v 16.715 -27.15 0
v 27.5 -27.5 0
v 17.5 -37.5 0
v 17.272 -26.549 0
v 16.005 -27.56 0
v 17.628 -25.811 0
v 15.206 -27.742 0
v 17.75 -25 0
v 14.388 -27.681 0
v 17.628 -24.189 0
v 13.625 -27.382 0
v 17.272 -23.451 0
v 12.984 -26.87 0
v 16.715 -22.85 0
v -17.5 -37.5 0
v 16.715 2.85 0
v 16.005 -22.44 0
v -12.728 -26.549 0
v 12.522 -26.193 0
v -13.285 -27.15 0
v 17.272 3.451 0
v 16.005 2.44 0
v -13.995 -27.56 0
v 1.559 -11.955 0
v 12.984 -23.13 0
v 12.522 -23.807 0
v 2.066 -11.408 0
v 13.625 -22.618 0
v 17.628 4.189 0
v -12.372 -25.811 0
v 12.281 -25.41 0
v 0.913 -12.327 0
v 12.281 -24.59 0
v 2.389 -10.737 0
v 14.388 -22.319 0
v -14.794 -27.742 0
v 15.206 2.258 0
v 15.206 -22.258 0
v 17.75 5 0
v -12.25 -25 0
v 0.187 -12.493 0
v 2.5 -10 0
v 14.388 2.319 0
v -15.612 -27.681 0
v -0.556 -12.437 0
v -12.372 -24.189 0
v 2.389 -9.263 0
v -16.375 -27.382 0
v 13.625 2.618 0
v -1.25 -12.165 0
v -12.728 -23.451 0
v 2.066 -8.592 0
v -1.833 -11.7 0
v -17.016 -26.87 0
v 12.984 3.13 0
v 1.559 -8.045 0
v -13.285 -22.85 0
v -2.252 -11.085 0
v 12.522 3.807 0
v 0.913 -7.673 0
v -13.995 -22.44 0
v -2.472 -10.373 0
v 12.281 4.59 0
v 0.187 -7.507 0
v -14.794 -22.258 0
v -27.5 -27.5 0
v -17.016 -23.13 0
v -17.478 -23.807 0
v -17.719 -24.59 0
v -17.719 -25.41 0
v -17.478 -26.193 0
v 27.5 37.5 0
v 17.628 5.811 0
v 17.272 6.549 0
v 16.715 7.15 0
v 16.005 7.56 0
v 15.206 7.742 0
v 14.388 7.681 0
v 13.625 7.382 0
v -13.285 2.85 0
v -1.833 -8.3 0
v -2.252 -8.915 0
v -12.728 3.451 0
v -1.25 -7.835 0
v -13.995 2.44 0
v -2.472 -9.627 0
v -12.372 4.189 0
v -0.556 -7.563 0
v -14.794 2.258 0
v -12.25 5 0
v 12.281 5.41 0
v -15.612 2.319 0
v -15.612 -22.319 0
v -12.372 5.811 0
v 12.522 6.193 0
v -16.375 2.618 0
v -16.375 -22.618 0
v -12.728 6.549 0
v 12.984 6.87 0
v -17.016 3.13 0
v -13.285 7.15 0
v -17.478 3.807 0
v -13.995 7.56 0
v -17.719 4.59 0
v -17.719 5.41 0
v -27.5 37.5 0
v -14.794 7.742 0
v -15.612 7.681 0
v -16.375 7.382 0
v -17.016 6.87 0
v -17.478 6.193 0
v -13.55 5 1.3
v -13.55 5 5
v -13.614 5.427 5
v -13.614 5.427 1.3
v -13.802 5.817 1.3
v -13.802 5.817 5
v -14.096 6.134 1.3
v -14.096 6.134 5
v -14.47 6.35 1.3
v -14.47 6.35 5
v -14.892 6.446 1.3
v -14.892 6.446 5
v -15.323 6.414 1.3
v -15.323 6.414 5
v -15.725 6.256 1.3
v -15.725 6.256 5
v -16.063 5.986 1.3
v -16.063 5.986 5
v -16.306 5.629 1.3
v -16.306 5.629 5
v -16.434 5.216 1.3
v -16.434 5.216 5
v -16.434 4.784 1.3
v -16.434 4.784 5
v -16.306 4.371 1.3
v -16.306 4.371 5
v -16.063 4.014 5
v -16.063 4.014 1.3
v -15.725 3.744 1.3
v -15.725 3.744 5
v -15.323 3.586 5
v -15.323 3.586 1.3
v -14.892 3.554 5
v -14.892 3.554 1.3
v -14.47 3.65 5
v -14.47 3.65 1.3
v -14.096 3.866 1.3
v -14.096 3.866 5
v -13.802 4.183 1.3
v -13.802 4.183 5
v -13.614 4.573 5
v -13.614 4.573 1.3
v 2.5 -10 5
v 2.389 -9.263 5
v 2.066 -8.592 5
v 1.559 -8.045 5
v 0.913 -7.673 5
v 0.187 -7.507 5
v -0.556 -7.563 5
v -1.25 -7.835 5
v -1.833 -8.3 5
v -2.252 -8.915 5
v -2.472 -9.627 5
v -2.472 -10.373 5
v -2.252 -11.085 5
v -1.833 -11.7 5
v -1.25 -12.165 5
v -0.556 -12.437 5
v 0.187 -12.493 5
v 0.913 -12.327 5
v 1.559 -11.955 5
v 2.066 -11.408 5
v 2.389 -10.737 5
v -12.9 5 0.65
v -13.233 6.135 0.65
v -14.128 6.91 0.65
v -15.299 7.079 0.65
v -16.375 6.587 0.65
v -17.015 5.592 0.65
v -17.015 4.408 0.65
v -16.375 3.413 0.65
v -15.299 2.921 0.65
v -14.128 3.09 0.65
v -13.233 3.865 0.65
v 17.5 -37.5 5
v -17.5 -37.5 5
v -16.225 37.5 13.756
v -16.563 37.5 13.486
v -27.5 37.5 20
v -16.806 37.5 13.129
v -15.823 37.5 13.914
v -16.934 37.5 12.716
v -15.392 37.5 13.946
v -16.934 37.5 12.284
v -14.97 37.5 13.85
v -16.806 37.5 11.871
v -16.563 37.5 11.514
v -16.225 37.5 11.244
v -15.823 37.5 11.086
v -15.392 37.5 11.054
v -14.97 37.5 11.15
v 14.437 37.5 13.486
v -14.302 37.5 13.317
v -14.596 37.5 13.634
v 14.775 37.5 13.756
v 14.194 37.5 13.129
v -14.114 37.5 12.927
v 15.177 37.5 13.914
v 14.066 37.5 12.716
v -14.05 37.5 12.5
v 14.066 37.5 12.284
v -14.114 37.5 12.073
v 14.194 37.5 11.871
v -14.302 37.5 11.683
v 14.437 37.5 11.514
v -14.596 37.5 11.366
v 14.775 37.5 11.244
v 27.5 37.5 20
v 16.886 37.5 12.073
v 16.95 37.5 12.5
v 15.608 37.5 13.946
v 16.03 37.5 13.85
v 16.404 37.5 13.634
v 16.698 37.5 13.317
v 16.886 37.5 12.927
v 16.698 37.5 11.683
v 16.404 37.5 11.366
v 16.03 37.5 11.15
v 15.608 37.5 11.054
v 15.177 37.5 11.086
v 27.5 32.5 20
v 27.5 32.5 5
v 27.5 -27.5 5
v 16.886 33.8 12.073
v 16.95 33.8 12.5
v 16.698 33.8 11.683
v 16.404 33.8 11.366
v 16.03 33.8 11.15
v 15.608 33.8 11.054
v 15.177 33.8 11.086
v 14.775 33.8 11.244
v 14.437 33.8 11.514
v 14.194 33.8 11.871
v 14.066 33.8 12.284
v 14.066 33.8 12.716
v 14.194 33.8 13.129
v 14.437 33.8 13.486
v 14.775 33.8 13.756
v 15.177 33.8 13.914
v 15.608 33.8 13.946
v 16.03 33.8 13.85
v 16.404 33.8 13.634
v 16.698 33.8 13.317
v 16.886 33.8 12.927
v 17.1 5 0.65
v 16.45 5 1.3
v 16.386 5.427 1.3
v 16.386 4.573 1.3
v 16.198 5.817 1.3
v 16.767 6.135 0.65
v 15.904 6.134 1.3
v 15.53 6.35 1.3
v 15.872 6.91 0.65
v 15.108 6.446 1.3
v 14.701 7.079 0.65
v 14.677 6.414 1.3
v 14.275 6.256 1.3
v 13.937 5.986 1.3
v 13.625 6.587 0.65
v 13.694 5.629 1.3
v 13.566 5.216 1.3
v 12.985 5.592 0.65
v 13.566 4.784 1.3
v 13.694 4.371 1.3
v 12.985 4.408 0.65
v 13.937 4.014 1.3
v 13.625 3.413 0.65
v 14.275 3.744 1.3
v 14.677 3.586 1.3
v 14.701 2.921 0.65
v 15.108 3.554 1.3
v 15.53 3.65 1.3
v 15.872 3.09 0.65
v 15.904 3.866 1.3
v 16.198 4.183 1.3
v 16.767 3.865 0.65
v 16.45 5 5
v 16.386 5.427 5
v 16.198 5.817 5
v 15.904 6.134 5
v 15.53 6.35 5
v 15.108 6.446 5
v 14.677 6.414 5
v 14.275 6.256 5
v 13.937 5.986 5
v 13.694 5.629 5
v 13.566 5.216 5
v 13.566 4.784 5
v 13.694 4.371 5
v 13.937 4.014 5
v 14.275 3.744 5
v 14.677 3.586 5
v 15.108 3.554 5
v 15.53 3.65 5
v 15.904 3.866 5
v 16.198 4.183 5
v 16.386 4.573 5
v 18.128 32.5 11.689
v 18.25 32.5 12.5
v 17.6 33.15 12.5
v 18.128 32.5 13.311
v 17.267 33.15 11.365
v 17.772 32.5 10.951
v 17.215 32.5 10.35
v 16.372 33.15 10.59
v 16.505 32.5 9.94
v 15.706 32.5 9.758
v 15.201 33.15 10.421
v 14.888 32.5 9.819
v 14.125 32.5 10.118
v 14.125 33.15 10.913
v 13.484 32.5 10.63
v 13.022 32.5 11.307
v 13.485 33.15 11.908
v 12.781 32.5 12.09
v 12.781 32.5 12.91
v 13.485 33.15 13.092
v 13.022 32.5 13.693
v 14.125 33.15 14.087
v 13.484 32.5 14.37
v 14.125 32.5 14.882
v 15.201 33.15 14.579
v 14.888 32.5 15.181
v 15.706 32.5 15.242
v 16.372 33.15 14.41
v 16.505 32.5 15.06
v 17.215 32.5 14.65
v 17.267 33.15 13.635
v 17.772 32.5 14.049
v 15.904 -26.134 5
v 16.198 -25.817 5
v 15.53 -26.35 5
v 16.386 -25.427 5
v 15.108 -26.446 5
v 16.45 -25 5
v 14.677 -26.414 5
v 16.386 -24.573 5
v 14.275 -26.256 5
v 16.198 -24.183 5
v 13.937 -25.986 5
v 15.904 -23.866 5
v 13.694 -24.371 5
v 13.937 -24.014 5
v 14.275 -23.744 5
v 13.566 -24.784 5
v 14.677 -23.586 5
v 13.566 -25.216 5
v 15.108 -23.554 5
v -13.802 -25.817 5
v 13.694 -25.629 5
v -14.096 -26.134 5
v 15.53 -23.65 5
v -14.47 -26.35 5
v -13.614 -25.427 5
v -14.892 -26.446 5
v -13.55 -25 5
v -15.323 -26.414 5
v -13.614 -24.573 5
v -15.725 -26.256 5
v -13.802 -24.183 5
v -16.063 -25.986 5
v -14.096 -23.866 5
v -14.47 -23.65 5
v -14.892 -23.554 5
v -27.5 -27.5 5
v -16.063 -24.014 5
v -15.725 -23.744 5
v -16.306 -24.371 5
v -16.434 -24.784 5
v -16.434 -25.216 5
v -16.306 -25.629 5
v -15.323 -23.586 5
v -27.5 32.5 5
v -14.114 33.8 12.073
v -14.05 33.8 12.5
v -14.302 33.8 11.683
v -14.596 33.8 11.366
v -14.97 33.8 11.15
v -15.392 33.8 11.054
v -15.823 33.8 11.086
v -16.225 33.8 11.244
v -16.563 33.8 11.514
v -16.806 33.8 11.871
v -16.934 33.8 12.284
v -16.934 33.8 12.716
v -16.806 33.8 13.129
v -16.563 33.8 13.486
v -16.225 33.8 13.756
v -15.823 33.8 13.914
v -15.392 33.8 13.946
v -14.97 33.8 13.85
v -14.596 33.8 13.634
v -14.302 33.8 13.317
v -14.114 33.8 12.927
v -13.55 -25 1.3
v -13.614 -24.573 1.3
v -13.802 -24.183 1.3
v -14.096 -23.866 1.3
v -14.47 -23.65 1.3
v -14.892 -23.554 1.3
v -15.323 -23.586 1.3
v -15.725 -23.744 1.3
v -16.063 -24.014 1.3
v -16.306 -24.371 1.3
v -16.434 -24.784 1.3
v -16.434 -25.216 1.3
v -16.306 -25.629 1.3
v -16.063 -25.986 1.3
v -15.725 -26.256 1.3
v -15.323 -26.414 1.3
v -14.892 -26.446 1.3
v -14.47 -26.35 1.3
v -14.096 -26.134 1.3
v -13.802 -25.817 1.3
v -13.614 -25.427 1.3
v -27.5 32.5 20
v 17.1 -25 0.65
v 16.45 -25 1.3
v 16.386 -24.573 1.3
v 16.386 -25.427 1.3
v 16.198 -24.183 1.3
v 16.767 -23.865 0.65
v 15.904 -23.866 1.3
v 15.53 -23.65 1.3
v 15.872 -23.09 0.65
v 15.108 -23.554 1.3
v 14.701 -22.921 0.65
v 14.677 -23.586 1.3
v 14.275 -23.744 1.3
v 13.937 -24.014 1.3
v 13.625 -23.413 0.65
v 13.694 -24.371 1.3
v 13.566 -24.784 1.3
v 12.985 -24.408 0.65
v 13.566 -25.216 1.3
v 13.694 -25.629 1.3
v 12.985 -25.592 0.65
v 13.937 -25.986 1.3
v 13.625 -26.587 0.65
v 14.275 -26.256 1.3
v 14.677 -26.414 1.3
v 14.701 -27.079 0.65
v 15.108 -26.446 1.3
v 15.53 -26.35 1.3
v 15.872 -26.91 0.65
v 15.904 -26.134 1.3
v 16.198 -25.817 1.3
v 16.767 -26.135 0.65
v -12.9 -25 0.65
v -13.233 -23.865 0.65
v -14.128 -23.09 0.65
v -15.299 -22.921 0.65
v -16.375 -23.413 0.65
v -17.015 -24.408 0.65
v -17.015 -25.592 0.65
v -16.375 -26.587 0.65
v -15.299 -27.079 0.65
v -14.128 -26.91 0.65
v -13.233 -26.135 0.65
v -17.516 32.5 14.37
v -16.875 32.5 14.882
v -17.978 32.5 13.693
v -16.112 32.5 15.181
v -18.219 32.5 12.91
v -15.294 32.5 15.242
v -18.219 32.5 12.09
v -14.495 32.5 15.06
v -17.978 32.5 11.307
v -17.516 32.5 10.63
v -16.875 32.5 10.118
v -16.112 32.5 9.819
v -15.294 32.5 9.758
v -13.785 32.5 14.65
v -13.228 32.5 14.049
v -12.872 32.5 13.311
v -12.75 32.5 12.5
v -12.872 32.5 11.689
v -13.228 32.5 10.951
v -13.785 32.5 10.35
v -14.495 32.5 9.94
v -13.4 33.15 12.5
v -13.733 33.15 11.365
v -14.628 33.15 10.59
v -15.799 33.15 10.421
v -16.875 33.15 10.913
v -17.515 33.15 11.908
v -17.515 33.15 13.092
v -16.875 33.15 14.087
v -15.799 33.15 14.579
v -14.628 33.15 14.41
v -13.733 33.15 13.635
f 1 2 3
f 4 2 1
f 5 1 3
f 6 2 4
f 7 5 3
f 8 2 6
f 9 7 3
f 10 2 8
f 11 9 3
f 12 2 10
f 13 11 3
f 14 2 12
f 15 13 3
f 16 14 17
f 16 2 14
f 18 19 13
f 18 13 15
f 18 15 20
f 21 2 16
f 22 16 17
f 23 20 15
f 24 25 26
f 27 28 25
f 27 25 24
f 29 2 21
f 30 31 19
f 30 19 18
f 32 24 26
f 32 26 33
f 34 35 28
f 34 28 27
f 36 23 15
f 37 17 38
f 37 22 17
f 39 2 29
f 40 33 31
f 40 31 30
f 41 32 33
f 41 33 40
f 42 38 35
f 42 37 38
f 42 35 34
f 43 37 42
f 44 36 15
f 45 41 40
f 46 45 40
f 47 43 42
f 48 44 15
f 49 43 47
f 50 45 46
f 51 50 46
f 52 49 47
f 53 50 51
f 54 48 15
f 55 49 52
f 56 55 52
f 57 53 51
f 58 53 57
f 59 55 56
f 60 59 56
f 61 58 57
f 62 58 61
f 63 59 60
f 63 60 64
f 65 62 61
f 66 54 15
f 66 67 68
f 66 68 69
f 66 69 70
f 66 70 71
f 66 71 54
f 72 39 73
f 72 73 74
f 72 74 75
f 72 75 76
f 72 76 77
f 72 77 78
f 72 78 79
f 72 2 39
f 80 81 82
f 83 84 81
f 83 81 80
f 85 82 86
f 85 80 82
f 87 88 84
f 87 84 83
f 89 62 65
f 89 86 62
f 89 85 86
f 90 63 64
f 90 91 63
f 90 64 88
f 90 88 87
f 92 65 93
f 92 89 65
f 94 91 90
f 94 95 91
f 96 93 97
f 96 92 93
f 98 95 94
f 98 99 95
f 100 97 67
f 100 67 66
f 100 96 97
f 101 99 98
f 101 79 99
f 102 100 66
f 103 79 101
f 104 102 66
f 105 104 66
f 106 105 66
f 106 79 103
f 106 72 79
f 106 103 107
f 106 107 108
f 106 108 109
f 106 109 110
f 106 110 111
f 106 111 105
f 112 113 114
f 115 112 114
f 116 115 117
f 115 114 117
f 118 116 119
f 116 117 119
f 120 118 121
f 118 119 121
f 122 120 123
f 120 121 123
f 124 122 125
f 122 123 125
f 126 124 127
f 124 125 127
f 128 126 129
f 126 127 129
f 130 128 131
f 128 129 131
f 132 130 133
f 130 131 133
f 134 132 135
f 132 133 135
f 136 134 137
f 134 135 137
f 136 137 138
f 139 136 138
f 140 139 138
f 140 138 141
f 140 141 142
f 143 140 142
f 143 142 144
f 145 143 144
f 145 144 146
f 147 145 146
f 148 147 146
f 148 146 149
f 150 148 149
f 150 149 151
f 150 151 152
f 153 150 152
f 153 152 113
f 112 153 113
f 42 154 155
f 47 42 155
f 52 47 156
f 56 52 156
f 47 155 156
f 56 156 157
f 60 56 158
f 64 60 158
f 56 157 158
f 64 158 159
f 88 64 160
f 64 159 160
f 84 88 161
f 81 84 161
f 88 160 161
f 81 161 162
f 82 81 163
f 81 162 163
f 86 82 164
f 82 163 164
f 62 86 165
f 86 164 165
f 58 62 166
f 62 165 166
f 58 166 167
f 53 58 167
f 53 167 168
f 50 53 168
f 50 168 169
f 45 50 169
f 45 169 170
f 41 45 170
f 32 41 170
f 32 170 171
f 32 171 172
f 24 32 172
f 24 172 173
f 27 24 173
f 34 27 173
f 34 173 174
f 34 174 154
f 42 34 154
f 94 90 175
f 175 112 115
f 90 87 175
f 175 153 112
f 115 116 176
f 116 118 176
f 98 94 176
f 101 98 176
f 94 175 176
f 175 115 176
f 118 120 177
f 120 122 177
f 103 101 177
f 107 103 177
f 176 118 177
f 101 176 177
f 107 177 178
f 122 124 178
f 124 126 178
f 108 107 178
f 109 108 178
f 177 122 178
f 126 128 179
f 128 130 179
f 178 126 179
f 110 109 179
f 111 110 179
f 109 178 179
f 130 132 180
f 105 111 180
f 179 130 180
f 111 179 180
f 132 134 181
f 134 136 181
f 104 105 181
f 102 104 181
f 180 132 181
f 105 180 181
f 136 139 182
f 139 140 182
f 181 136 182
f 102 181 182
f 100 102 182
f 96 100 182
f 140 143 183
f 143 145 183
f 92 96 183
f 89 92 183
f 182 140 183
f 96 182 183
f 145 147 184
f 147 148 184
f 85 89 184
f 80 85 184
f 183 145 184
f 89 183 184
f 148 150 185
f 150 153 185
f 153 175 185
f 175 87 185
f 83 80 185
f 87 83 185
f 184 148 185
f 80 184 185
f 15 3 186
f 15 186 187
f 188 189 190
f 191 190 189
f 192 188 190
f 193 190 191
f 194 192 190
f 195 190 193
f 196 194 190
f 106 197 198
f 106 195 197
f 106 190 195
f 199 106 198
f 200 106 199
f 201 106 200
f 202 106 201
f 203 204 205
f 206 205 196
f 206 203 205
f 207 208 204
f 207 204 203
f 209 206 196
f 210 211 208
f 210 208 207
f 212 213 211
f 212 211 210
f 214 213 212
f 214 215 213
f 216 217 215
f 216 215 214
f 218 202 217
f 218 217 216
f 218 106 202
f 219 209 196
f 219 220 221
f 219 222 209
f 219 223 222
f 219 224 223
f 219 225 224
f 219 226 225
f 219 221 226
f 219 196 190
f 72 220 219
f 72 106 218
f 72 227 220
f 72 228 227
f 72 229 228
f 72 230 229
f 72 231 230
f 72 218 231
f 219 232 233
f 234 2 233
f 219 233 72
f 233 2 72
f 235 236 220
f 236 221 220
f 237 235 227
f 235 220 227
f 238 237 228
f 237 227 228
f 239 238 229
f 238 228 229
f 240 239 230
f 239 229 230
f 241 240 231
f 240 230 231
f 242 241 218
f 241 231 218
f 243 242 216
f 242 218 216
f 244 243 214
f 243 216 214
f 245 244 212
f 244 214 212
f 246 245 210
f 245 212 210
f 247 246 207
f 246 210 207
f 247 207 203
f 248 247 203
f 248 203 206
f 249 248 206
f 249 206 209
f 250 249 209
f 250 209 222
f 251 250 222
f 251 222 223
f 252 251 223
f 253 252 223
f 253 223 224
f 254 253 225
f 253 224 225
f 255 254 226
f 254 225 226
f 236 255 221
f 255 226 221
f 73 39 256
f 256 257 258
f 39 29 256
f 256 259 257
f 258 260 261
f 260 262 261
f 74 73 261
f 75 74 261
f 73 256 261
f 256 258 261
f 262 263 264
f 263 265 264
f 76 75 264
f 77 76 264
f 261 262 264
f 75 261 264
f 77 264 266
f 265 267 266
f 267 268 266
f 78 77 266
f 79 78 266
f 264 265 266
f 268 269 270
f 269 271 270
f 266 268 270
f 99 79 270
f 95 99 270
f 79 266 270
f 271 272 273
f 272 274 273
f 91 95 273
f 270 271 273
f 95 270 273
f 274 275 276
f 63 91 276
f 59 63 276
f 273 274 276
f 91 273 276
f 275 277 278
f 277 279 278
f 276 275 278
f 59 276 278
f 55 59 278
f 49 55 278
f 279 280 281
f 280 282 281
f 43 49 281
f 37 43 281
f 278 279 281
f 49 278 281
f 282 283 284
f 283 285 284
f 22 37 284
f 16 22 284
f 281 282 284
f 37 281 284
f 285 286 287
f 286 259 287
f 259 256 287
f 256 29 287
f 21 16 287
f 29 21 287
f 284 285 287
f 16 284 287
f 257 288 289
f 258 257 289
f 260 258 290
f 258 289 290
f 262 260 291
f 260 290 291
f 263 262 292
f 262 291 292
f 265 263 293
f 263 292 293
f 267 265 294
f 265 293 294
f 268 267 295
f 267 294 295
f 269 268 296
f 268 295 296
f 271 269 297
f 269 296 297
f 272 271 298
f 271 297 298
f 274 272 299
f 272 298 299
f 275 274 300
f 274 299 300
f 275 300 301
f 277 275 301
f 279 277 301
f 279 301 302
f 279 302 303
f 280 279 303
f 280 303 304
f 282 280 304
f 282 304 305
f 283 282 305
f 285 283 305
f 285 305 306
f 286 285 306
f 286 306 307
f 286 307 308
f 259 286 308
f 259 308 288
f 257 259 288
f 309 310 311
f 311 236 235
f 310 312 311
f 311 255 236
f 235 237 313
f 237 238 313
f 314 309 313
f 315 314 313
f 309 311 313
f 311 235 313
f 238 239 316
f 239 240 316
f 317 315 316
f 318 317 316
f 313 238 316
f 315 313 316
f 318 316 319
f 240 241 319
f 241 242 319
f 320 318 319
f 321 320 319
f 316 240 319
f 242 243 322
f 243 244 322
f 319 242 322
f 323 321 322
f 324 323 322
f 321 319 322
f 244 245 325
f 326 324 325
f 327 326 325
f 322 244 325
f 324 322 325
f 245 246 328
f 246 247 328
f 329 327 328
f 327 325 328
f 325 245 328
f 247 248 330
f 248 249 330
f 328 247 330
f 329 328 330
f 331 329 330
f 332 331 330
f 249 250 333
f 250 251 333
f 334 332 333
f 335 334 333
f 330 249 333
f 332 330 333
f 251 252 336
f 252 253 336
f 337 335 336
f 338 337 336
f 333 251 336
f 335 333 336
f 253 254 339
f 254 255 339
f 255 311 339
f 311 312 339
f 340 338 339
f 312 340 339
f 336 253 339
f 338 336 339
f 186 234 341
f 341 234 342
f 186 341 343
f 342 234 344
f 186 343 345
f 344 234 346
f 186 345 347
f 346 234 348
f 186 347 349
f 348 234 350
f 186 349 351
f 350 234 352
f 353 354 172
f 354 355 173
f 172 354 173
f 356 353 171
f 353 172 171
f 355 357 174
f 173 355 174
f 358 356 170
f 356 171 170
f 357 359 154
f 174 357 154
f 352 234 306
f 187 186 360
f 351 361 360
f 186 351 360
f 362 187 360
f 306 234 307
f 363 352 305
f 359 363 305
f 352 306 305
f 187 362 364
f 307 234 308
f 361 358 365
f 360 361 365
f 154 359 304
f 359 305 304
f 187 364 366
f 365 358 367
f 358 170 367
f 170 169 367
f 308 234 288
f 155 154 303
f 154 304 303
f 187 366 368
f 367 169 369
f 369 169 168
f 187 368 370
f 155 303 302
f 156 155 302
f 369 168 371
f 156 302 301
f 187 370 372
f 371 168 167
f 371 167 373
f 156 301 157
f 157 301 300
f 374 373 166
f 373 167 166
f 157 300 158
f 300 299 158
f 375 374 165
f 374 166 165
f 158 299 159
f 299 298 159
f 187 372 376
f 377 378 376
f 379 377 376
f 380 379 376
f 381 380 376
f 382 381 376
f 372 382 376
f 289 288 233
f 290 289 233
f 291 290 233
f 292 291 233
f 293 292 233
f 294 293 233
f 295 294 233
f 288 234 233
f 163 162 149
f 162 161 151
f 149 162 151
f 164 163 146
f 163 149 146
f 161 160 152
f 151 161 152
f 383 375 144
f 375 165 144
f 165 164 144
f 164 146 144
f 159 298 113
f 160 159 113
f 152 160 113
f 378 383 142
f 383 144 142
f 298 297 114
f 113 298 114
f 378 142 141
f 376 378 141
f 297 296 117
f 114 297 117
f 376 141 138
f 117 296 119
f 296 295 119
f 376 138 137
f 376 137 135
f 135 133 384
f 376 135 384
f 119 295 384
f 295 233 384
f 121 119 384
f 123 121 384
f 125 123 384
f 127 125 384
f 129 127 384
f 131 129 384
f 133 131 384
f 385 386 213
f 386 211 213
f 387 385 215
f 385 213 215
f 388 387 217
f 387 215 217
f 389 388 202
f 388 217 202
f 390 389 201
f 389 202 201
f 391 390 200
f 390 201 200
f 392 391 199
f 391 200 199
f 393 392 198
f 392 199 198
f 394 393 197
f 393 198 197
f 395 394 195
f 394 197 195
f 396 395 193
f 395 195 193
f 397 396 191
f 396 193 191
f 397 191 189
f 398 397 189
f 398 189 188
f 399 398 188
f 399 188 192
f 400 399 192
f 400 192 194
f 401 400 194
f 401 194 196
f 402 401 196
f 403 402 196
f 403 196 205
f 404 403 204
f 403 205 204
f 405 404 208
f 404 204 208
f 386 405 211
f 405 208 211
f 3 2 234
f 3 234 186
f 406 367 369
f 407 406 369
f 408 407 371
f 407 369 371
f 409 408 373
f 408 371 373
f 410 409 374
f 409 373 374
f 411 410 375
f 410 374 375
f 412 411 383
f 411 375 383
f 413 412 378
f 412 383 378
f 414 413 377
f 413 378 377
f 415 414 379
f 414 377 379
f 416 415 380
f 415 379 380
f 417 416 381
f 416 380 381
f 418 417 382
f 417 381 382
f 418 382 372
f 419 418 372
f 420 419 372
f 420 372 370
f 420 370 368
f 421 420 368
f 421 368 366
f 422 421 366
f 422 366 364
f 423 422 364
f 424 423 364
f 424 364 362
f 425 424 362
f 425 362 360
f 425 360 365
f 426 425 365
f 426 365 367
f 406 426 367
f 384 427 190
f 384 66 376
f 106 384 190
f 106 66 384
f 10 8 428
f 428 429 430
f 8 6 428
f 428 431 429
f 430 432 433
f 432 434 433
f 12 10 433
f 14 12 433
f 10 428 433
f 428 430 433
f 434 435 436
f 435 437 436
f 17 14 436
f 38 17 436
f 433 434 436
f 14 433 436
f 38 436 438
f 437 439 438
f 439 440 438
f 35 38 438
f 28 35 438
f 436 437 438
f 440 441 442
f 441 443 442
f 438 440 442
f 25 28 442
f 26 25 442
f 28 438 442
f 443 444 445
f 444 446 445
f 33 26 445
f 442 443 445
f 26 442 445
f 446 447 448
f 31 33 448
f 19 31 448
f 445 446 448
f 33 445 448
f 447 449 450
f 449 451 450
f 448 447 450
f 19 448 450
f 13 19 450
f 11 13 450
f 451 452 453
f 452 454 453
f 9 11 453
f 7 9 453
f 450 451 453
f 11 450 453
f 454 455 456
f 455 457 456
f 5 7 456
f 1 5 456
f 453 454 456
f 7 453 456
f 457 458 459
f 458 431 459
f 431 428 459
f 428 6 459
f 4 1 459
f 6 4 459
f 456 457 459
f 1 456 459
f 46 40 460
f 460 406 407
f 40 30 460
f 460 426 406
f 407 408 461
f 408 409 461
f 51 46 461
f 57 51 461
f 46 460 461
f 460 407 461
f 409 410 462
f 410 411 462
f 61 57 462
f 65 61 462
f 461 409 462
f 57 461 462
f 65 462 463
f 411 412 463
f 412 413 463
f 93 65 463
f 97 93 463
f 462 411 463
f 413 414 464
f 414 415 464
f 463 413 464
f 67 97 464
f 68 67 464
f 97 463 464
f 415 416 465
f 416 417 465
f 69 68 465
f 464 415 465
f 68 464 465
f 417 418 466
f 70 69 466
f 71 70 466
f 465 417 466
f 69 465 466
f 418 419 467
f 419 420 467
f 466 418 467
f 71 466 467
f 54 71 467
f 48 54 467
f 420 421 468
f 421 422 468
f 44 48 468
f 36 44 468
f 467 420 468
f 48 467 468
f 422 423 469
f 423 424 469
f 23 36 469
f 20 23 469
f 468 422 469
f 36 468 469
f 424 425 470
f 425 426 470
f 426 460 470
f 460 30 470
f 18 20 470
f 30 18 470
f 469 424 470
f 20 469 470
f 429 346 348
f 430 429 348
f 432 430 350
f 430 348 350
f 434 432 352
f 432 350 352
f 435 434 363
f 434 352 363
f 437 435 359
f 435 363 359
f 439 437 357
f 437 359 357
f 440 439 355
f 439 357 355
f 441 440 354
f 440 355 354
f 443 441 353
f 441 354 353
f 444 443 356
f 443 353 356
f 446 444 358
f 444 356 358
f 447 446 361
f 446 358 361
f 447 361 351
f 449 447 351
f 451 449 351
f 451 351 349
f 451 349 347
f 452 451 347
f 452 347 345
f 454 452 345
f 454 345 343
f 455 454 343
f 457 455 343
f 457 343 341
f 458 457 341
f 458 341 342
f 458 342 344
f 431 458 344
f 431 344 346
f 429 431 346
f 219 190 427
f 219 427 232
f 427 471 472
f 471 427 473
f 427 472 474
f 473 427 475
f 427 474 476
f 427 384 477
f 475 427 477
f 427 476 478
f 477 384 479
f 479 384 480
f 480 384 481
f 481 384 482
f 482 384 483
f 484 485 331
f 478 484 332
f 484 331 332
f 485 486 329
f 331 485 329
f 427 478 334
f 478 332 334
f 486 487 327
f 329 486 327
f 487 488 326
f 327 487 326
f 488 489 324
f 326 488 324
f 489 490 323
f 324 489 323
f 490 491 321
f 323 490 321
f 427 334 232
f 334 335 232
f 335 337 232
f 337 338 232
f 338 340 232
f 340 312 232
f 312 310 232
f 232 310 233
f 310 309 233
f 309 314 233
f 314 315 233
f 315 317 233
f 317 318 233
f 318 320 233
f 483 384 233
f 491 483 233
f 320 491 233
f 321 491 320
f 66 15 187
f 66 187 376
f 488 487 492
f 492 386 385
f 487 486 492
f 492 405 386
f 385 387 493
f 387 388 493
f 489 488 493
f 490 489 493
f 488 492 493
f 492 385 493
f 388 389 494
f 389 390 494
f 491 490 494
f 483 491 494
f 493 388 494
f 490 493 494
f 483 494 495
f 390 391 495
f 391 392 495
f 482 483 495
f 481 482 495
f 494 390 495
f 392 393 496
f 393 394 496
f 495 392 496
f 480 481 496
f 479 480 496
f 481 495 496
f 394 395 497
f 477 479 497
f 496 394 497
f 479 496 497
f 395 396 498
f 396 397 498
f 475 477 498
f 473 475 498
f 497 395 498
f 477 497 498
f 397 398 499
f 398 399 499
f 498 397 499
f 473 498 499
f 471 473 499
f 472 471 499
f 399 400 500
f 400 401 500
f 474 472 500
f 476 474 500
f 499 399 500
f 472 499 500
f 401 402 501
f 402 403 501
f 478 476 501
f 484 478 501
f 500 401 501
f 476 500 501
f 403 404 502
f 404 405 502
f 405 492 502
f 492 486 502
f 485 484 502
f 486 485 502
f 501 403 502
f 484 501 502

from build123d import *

# Parameters (mm, degrees)
BOSS_EXTRUDE1_DEPTH                               = 5
CUT_EXTRUDE1_REACH                                = 7
SKETCH2_R                                         = 2.5
SKETCH3_W                                         = 55
SKETCH3_H                                         = 5
BOSS_EXTRUDE2_DEPTH                               = 15
CSK_FOR_M2_5_FLAT_HEAD_MACHINE_SCREW1_D           = 2.9
CSK_FOR_M2_5_FLAT_HEAD_MACHINE_SCREW1_CSINK_D     = 5.5
CSK_FOR_M2_5_FLAT_HEAD_MACHINE_SCREW1_CSINK_ANGLE = 90
CSK_FOR_M2_5_FLAT_HEAD_MACHINE_SCREW2_D           = 2.9
CSK_FOR_M2_5_FLAT_HEAD_MACHINE_SCREW2_DEPTH       = 5
CSK_FOR_M2_5_FLAT_HEAD_MACHINE_SCREW2_CSINK_D     = 5.5
CSK_FOR_M2_5_FLAT_HEAD_MACHINE_SCREW2_CSINK_ANGLE = 90


with BuildPart() as part:
    # Sketch1 → Boss-Extrude1 (new body)
    with BuildSketch(Plane.XY):
        Polygon((-17.5, -37.5), (-27.5, -27.5), (-27.5, 37.5), (27.5, 37.5), (27.5, -27.5), (17.5, -37.5), align=None)
    extrude(amount=BOSS_EXTRUDE1_DEPTH)

    # Sketch2 → Cut-Extrude1 (cut, up to next)
    with BuildSketch(Plane.XY.offset(5), mode=Mode.PRIVATE) as cut_extrude1_sk1:
        with Locations((0, -10)):
            Circle(SKETCH2_R)
    cut_extrude1_tool1 = extrude(cut_extrude1_sk1.sketch, amount=-CUT_EXTRUDE1_REACH, mode=Mode.PRIVATE) & part.part
    add(cut_extrude1_tool1.solids().sort_by_distance((0, -10, 5))[0], mode=Mode.SUBTRACT)

    # Sketch3 → Boss-Extrude2 (add)
    with BuildSketch(Plane.XY.offset(5)):
        with Locations((0, 35)):
            Rectangle(SKETCH3_W, SKETCH3_H)
    extrude(amount=BOSS_EXTRUDE2_DEPTH)

    # CSK for M2.5 Flat Head Machine Screw1 (through all)
    with Locations(Plane(origin=(0, 32.5, 0), x_dir=(-1, 0, 0), z_dir=(0, -1, 0))):
        with Locations((-15.5, -12.5), (15.5, -12.5)):
            CounterSinkHole(CSK_FOR_M2_5_FLAT_HEAD_MACHINE_SCREW1_D / 2, CSK_FOR_M2_5_FLAT_HEAD_MACHINE_SCREW1_CSINK_D / 2, counter_sink_angle=CSK_FOR_M2_5_FLAT_HEAD_MACHINE_SCREW1_CSINK_ANGLE)

    # CSK for M2.5 Flat Head Machine Screw2
    with Locations(Plane(origin=(0, 0, 0), x_dir=(-1, 0, 0), z_dir=(0, 0, -1))):
        with Locations((-15, 5), (15, 5), (-15, -25), (15, -25)):
            CounterSinkHole(CSK_FOR_M2_5_FLAT_HEAD_MACHINE_SCREW2_D / 2, CSK_FOR_M2_5_FLAT_HEAD_MACHINE_SCREW2_CSINK_D / 2, depth=CSK_FOR_M2_5_FLAT_HEAD_MACHINE_SCREW2_DEPTH, counter_sink_angle=CSK_FOR_M2_5_FLAT_HEAD_MACHINE_SCREW2_CSINK_ANGLE)


solid = part.part
